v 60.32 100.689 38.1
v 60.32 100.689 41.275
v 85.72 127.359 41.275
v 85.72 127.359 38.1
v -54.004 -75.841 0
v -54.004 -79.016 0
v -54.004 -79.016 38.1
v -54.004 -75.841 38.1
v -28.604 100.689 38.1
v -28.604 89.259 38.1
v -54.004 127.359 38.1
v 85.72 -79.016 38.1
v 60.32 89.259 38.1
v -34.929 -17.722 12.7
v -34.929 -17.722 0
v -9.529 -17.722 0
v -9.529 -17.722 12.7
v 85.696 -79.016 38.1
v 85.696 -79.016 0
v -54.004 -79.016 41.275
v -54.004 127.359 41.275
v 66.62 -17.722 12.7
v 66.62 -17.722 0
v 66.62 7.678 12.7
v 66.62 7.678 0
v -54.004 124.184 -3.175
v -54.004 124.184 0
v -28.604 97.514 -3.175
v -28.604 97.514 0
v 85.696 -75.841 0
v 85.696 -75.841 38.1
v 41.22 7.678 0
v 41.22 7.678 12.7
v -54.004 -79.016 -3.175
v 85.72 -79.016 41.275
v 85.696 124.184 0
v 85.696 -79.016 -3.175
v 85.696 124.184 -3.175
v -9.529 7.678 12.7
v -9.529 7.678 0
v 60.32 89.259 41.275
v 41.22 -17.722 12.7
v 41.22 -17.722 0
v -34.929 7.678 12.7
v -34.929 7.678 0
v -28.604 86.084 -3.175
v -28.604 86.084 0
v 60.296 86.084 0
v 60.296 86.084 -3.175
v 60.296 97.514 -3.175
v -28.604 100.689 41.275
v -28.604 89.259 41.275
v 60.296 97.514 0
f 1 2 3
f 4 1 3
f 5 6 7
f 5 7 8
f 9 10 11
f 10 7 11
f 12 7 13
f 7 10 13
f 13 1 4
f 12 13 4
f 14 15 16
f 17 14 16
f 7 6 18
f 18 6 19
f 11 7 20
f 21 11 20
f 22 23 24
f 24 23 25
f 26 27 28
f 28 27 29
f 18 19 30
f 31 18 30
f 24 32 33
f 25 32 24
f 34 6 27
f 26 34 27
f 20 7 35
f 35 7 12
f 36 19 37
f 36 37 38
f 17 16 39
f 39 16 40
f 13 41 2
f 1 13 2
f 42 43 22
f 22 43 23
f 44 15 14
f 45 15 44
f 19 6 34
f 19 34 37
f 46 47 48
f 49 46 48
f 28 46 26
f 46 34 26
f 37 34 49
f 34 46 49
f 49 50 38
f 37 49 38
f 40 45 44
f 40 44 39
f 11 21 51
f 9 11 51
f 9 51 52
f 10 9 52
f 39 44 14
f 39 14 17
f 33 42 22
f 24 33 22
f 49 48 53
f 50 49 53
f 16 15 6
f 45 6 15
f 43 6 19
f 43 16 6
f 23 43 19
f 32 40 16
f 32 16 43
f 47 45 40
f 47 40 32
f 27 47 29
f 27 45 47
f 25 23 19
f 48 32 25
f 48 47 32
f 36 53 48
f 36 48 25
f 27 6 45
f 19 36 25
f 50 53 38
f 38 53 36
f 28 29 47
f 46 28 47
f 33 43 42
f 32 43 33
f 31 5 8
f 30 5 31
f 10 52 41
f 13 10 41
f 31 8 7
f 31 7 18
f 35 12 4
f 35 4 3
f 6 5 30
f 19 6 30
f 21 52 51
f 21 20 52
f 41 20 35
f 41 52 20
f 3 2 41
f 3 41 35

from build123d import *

# Parameters (mm, degrees)
F0_W      = 139.7
F0_H      = 203.2
F1_DEPTH  = 3.175
F3_DEPTH  = 3.175
F4_W      = 25.4
F4_H      = 25.4
F5_DEPTH  = 12.7
F6_W      = 139.7
F6_H      = 3.175
F7_DEPTH  = 38.1
F8_W      = 139.7241105051
F8_H      = 203.2
F9_DEPTH  = 3.175
F11_DEPTH = 25.4
F12_DEPTH = 3.175


# Not quite as in the source:
# - a length typed as a fraction of an inch, garbled in the dataset ("3 / 203.2 mm" for 3/8 in), is restored
# - a feature names something its author has since deleted; it is built from what else it names


with BuildPart() as f1:
    # F0 (on Top) → F1 (new body)
    with BuildSketch(Plane.XY):
        with Locations((15.8455121665, 22.5839115024)):
            Rectangle(F0_W, F0_H)
    extrude(amount=-F1_DEPTH)

    # F2 (on face) → F3 (cut)
    with BuildSketch(Plane.XY):
        Polygon((-28.6044878335, 97.5139115024), (-28.6044878335, 86.0839115024), (60.2955121665, 86.0839115024), (60.2955121665, 97.5139115024), (85.6955121665, 124.1839115024), (-54.0044878335, 124.1839115024), align=None)
    extrude(amount=-F3_DEPTH, mode=Mode.SUBTRACT)

    # F4 (on face) → F5 (join)
    with BuildSketch(Plane.XY):
        with Locations((-22.2290878335, -5.0218783647)):
            Rectangle(F4_W, F4_H)
        with Locations((53.9201121665, -5.0218783647)):
            Rectangle(F4_W, F4_H)
    extrude(amount=F5_DEPTH)


with BuildPart() as f7:
    # F6 (on face) → F7 (new body)
    with BuildSketch(Plane.XY):
        with Locations((15.8455121665, -77.4285884976)):
            Rectangle(F6_W, F6_H)
    extrude(amount=F7_DEPTH)


with BuildPart() as f9:
    # F8 (on face) → F9 (new body)
    with BuildSketch(Plane.XY.offset(38.1)):
        with Locations((15.8575674191, 25.7589115024)):
            Rectangle(F8_W, F8_H)
    extrude(amount=F9_DEPTH)

    # F10 (on face) → F11 (cut)
    with BuildSketch(Plane.XY.offset(41.275)):
        Polygon((-28.6044878335, 100.6889115024), (-28.6044878335, 89.2589115024), (60.3196226716, 89.2589115024), (60.3196226716, 100.6889115024), (85.7196226716, 127.3589115024), (-54.0044878335, 127.3589115024), align=None)
    extrude(amount=-F11_DEPTH, mode=Mode.SUBTRACT)

    # F12 (add): a face of the model
    f12_faces = [f9.faces().sort_by_distance(p)[0] for p in [
        (15.8575674191, -75.8410884976, 39.6875),
    ]]
    extrude(f12_faces, amount=F12_DEPTH)


solid = Compound([f1.part, f7.part, f9.part])
